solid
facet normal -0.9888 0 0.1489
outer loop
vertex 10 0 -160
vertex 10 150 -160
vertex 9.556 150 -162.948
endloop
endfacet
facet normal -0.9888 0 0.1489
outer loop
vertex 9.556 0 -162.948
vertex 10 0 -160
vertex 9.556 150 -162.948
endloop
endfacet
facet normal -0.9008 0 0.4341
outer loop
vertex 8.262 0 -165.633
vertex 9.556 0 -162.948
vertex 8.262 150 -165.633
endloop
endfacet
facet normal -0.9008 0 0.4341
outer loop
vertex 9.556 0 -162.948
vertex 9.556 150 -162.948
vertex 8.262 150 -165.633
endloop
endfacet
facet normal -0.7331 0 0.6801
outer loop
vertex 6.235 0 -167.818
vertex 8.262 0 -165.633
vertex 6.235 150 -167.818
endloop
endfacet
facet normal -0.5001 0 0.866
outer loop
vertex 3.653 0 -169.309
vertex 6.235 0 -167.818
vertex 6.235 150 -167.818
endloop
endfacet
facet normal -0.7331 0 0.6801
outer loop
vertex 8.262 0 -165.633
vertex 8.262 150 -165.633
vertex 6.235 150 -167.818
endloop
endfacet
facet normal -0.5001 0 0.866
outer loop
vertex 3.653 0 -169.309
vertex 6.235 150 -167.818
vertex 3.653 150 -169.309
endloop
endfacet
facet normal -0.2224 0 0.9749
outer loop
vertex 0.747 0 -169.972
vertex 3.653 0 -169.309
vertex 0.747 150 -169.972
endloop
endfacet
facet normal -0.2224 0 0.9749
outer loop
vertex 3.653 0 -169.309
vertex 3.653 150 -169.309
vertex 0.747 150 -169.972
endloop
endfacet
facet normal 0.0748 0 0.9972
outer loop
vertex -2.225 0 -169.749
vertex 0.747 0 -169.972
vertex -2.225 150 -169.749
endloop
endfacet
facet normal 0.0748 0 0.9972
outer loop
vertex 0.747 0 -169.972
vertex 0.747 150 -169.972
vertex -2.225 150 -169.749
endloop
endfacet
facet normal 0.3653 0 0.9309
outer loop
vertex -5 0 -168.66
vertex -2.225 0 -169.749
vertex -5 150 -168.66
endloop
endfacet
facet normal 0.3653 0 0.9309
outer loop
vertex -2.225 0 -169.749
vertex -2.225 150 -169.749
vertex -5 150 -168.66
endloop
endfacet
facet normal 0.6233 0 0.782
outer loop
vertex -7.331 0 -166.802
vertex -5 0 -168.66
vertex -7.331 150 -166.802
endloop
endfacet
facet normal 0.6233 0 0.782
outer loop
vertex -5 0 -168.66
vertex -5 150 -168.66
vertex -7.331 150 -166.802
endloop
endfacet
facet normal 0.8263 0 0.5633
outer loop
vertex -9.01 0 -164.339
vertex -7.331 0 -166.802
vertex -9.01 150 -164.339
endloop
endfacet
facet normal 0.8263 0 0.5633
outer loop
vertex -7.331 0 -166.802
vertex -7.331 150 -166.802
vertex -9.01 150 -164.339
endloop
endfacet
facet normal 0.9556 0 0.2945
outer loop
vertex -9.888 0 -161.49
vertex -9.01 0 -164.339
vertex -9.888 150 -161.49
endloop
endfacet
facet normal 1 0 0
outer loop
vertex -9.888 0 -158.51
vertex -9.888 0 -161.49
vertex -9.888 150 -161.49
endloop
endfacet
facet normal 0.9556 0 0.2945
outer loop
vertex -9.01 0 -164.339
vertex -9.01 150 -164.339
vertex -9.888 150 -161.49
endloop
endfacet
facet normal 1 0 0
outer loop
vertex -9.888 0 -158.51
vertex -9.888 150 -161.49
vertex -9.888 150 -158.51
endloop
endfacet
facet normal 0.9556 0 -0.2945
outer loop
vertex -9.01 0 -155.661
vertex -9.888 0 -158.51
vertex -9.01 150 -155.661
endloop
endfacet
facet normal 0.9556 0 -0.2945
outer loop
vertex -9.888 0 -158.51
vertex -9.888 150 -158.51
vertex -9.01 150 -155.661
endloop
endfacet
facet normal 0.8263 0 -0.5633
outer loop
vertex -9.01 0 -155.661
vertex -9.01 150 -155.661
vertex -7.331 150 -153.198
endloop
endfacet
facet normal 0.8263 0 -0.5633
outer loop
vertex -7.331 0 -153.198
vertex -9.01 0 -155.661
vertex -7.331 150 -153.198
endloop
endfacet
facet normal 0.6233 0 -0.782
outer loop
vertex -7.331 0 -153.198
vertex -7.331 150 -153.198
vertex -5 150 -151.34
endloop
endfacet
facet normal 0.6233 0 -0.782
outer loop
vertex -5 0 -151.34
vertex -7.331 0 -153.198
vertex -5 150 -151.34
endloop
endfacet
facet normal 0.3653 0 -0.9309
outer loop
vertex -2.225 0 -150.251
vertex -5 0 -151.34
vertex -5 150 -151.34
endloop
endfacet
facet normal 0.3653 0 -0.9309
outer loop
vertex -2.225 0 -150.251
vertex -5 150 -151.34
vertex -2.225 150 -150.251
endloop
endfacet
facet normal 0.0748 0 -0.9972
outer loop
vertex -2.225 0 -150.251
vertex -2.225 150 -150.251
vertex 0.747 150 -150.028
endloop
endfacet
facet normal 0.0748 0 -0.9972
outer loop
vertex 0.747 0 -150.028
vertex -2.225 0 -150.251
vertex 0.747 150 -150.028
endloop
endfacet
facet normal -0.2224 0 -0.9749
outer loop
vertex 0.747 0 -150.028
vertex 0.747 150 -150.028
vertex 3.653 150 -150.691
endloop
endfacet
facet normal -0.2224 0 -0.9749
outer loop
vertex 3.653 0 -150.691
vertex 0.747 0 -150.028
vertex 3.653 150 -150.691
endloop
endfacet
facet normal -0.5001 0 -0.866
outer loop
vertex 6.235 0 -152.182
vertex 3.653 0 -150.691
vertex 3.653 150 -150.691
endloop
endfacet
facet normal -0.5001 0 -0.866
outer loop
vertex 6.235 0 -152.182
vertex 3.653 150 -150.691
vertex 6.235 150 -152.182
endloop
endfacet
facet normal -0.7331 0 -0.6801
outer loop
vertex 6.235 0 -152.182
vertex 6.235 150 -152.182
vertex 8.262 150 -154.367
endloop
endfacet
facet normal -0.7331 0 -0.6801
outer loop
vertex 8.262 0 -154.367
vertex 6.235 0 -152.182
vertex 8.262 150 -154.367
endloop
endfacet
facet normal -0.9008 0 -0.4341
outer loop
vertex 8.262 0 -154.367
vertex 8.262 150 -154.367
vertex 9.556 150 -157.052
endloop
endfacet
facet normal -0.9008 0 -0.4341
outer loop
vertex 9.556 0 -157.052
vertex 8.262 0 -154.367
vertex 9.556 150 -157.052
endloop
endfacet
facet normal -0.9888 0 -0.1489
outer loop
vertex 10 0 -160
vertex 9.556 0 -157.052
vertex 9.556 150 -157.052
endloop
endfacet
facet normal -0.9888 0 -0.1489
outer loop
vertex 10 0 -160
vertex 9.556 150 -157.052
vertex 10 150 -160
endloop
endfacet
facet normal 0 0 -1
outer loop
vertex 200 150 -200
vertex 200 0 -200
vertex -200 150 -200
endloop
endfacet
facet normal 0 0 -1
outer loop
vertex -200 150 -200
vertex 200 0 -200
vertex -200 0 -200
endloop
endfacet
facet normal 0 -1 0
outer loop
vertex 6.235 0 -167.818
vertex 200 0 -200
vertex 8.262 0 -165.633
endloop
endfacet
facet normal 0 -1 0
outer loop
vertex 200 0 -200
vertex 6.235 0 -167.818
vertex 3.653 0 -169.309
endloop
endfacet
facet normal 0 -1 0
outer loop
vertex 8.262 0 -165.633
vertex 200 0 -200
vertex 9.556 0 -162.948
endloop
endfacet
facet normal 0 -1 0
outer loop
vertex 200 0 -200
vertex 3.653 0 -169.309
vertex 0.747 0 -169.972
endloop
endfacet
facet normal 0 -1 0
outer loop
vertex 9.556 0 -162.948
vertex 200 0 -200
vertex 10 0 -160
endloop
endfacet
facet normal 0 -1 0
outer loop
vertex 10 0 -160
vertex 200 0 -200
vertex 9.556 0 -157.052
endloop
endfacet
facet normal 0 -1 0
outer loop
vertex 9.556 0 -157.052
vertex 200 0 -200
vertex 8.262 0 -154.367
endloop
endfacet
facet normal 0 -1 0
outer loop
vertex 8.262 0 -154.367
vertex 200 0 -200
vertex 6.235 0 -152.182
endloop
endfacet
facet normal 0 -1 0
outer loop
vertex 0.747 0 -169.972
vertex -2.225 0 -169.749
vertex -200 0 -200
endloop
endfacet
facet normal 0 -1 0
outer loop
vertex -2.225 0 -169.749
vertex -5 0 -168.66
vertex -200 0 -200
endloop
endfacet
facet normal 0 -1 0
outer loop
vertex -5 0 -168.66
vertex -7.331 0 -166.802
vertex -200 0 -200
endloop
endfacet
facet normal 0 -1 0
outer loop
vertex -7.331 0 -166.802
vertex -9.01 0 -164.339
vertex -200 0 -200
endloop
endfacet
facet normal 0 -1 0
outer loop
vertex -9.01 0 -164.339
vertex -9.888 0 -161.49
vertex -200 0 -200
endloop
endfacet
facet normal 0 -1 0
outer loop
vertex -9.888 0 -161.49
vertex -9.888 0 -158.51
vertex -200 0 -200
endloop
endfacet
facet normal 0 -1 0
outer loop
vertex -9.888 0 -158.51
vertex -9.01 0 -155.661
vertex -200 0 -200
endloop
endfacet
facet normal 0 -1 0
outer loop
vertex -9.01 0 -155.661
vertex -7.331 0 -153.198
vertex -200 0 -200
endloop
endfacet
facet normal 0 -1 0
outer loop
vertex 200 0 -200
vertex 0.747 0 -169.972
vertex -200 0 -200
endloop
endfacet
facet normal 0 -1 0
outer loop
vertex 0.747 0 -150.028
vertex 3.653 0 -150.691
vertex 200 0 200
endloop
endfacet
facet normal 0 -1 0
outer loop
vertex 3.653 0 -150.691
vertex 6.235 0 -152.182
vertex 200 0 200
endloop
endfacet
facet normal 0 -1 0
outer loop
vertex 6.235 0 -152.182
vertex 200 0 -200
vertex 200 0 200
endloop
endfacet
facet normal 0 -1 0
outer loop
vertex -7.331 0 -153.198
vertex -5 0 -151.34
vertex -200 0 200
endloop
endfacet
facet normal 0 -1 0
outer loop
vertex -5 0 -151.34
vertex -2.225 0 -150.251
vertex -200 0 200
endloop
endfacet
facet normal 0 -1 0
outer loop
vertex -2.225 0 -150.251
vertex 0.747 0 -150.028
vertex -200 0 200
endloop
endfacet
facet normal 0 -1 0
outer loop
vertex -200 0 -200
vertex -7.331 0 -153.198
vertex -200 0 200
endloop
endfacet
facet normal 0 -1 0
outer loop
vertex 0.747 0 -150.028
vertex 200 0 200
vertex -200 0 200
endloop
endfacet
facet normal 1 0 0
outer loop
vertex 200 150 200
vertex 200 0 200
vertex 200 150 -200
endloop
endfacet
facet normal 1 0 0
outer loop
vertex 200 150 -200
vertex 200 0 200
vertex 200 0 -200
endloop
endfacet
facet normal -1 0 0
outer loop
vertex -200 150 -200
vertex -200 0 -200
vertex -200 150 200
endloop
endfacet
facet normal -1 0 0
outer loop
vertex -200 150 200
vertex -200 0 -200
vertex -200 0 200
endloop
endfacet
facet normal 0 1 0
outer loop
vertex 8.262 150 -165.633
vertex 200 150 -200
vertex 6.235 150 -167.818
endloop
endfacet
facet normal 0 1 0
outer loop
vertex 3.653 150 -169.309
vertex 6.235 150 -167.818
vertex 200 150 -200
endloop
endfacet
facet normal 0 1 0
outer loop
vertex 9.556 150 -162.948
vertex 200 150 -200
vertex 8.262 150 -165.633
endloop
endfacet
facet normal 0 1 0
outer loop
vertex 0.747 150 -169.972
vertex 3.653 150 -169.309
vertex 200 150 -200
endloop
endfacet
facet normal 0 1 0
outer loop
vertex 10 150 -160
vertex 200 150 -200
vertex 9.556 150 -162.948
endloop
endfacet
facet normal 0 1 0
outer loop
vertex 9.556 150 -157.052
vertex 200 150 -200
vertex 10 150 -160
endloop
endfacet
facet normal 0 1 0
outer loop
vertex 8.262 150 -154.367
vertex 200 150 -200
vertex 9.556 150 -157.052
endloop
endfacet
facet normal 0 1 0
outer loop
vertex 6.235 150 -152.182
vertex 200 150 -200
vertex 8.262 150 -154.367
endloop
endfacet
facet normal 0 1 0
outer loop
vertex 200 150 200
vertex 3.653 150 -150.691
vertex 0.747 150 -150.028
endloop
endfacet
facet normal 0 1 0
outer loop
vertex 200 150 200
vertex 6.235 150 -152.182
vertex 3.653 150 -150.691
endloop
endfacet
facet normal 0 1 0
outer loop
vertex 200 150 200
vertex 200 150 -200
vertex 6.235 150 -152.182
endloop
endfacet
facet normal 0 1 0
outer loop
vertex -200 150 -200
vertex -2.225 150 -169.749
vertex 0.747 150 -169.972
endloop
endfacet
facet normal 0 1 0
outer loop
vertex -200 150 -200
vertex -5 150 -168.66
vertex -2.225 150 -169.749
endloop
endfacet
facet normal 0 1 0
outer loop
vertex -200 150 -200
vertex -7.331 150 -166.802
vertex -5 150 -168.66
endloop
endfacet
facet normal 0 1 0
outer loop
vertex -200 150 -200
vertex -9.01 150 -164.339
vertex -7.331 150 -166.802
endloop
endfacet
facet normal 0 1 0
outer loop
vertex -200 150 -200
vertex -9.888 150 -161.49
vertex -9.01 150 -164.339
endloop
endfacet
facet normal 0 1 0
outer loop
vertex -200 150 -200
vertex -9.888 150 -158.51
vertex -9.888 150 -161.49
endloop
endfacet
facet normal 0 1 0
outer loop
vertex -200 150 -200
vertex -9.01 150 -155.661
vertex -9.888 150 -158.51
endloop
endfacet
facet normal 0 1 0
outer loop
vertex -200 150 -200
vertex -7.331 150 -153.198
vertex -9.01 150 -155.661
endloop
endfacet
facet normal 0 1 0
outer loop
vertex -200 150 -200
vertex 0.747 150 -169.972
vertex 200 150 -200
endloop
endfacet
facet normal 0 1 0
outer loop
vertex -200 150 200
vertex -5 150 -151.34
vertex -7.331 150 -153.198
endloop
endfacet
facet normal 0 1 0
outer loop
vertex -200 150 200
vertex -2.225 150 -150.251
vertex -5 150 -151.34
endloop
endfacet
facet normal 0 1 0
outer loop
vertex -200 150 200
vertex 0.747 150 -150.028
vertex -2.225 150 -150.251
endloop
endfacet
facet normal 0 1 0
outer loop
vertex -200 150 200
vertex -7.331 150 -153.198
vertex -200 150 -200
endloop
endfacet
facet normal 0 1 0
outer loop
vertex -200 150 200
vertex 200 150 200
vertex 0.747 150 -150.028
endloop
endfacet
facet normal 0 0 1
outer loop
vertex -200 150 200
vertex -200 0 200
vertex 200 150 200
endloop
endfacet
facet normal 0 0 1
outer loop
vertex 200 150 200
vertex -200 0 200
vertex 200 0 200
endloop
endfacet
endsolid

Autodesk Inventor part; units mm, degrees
ref_plane "YZ Plane" through (0, 0, 0) normal (1, 0, 0) x (0, 1, 0)
ref_plane "XZ Plane" through (0, 0, 0) normal (0, 1, 0) x (-1, 0, 0)
ref_plane "XY Plane" through (0, 0, 0) normal (0, 0, 1) x (1, 0, 0)
sketch "Boceto1" plane through (0, 0, 0) normal (0, 1, 0) x (-1, 0, 0)
  line L0 (200, 200) -> (-200, 200)
  line L1 (-200, 200) -> (-200, -200)
  line L2 (-200, -200) -> (200, -200)
  line L3 (200, -200) -> (200, 200)
  point P0 (0, 0)
  dimension "d0" = 400
  dimension "L" = 400
  dimension "d2" = 200
  dimension "d3" = 200
extrude "Extrusión1" add sketch "Boceto1" along normal blind 150
sketch "Boceto3" plane through (0, 150, 0) normal (0, 1, 0) x (1, 0, 0)
  circle A0 centre (0, 160) radius 10
  line L0 (200, 200) -> (-200, 200) projected
  point P0 (0, 0)
  dimension "d6" = 20
  dimension "d9" = 40
extrude "Extrusión2" cut sketch "Boceto3" against normal blind 153.75
ref_plane "Plano de trabajo1" through (0, 0, 200) normal (1, 0, 0) x (0, 0, -1)
ref_plane "Plano de trabajo2" through (-200, 0, 0) normal (0, 0, 1) x (1, 0, 0)
equation "\"d0\" = L"
equation "\"d2\" = 0.5 * L"
equation "\"d3\" = 0.5 * L"
properties part number "CajaBoya"
